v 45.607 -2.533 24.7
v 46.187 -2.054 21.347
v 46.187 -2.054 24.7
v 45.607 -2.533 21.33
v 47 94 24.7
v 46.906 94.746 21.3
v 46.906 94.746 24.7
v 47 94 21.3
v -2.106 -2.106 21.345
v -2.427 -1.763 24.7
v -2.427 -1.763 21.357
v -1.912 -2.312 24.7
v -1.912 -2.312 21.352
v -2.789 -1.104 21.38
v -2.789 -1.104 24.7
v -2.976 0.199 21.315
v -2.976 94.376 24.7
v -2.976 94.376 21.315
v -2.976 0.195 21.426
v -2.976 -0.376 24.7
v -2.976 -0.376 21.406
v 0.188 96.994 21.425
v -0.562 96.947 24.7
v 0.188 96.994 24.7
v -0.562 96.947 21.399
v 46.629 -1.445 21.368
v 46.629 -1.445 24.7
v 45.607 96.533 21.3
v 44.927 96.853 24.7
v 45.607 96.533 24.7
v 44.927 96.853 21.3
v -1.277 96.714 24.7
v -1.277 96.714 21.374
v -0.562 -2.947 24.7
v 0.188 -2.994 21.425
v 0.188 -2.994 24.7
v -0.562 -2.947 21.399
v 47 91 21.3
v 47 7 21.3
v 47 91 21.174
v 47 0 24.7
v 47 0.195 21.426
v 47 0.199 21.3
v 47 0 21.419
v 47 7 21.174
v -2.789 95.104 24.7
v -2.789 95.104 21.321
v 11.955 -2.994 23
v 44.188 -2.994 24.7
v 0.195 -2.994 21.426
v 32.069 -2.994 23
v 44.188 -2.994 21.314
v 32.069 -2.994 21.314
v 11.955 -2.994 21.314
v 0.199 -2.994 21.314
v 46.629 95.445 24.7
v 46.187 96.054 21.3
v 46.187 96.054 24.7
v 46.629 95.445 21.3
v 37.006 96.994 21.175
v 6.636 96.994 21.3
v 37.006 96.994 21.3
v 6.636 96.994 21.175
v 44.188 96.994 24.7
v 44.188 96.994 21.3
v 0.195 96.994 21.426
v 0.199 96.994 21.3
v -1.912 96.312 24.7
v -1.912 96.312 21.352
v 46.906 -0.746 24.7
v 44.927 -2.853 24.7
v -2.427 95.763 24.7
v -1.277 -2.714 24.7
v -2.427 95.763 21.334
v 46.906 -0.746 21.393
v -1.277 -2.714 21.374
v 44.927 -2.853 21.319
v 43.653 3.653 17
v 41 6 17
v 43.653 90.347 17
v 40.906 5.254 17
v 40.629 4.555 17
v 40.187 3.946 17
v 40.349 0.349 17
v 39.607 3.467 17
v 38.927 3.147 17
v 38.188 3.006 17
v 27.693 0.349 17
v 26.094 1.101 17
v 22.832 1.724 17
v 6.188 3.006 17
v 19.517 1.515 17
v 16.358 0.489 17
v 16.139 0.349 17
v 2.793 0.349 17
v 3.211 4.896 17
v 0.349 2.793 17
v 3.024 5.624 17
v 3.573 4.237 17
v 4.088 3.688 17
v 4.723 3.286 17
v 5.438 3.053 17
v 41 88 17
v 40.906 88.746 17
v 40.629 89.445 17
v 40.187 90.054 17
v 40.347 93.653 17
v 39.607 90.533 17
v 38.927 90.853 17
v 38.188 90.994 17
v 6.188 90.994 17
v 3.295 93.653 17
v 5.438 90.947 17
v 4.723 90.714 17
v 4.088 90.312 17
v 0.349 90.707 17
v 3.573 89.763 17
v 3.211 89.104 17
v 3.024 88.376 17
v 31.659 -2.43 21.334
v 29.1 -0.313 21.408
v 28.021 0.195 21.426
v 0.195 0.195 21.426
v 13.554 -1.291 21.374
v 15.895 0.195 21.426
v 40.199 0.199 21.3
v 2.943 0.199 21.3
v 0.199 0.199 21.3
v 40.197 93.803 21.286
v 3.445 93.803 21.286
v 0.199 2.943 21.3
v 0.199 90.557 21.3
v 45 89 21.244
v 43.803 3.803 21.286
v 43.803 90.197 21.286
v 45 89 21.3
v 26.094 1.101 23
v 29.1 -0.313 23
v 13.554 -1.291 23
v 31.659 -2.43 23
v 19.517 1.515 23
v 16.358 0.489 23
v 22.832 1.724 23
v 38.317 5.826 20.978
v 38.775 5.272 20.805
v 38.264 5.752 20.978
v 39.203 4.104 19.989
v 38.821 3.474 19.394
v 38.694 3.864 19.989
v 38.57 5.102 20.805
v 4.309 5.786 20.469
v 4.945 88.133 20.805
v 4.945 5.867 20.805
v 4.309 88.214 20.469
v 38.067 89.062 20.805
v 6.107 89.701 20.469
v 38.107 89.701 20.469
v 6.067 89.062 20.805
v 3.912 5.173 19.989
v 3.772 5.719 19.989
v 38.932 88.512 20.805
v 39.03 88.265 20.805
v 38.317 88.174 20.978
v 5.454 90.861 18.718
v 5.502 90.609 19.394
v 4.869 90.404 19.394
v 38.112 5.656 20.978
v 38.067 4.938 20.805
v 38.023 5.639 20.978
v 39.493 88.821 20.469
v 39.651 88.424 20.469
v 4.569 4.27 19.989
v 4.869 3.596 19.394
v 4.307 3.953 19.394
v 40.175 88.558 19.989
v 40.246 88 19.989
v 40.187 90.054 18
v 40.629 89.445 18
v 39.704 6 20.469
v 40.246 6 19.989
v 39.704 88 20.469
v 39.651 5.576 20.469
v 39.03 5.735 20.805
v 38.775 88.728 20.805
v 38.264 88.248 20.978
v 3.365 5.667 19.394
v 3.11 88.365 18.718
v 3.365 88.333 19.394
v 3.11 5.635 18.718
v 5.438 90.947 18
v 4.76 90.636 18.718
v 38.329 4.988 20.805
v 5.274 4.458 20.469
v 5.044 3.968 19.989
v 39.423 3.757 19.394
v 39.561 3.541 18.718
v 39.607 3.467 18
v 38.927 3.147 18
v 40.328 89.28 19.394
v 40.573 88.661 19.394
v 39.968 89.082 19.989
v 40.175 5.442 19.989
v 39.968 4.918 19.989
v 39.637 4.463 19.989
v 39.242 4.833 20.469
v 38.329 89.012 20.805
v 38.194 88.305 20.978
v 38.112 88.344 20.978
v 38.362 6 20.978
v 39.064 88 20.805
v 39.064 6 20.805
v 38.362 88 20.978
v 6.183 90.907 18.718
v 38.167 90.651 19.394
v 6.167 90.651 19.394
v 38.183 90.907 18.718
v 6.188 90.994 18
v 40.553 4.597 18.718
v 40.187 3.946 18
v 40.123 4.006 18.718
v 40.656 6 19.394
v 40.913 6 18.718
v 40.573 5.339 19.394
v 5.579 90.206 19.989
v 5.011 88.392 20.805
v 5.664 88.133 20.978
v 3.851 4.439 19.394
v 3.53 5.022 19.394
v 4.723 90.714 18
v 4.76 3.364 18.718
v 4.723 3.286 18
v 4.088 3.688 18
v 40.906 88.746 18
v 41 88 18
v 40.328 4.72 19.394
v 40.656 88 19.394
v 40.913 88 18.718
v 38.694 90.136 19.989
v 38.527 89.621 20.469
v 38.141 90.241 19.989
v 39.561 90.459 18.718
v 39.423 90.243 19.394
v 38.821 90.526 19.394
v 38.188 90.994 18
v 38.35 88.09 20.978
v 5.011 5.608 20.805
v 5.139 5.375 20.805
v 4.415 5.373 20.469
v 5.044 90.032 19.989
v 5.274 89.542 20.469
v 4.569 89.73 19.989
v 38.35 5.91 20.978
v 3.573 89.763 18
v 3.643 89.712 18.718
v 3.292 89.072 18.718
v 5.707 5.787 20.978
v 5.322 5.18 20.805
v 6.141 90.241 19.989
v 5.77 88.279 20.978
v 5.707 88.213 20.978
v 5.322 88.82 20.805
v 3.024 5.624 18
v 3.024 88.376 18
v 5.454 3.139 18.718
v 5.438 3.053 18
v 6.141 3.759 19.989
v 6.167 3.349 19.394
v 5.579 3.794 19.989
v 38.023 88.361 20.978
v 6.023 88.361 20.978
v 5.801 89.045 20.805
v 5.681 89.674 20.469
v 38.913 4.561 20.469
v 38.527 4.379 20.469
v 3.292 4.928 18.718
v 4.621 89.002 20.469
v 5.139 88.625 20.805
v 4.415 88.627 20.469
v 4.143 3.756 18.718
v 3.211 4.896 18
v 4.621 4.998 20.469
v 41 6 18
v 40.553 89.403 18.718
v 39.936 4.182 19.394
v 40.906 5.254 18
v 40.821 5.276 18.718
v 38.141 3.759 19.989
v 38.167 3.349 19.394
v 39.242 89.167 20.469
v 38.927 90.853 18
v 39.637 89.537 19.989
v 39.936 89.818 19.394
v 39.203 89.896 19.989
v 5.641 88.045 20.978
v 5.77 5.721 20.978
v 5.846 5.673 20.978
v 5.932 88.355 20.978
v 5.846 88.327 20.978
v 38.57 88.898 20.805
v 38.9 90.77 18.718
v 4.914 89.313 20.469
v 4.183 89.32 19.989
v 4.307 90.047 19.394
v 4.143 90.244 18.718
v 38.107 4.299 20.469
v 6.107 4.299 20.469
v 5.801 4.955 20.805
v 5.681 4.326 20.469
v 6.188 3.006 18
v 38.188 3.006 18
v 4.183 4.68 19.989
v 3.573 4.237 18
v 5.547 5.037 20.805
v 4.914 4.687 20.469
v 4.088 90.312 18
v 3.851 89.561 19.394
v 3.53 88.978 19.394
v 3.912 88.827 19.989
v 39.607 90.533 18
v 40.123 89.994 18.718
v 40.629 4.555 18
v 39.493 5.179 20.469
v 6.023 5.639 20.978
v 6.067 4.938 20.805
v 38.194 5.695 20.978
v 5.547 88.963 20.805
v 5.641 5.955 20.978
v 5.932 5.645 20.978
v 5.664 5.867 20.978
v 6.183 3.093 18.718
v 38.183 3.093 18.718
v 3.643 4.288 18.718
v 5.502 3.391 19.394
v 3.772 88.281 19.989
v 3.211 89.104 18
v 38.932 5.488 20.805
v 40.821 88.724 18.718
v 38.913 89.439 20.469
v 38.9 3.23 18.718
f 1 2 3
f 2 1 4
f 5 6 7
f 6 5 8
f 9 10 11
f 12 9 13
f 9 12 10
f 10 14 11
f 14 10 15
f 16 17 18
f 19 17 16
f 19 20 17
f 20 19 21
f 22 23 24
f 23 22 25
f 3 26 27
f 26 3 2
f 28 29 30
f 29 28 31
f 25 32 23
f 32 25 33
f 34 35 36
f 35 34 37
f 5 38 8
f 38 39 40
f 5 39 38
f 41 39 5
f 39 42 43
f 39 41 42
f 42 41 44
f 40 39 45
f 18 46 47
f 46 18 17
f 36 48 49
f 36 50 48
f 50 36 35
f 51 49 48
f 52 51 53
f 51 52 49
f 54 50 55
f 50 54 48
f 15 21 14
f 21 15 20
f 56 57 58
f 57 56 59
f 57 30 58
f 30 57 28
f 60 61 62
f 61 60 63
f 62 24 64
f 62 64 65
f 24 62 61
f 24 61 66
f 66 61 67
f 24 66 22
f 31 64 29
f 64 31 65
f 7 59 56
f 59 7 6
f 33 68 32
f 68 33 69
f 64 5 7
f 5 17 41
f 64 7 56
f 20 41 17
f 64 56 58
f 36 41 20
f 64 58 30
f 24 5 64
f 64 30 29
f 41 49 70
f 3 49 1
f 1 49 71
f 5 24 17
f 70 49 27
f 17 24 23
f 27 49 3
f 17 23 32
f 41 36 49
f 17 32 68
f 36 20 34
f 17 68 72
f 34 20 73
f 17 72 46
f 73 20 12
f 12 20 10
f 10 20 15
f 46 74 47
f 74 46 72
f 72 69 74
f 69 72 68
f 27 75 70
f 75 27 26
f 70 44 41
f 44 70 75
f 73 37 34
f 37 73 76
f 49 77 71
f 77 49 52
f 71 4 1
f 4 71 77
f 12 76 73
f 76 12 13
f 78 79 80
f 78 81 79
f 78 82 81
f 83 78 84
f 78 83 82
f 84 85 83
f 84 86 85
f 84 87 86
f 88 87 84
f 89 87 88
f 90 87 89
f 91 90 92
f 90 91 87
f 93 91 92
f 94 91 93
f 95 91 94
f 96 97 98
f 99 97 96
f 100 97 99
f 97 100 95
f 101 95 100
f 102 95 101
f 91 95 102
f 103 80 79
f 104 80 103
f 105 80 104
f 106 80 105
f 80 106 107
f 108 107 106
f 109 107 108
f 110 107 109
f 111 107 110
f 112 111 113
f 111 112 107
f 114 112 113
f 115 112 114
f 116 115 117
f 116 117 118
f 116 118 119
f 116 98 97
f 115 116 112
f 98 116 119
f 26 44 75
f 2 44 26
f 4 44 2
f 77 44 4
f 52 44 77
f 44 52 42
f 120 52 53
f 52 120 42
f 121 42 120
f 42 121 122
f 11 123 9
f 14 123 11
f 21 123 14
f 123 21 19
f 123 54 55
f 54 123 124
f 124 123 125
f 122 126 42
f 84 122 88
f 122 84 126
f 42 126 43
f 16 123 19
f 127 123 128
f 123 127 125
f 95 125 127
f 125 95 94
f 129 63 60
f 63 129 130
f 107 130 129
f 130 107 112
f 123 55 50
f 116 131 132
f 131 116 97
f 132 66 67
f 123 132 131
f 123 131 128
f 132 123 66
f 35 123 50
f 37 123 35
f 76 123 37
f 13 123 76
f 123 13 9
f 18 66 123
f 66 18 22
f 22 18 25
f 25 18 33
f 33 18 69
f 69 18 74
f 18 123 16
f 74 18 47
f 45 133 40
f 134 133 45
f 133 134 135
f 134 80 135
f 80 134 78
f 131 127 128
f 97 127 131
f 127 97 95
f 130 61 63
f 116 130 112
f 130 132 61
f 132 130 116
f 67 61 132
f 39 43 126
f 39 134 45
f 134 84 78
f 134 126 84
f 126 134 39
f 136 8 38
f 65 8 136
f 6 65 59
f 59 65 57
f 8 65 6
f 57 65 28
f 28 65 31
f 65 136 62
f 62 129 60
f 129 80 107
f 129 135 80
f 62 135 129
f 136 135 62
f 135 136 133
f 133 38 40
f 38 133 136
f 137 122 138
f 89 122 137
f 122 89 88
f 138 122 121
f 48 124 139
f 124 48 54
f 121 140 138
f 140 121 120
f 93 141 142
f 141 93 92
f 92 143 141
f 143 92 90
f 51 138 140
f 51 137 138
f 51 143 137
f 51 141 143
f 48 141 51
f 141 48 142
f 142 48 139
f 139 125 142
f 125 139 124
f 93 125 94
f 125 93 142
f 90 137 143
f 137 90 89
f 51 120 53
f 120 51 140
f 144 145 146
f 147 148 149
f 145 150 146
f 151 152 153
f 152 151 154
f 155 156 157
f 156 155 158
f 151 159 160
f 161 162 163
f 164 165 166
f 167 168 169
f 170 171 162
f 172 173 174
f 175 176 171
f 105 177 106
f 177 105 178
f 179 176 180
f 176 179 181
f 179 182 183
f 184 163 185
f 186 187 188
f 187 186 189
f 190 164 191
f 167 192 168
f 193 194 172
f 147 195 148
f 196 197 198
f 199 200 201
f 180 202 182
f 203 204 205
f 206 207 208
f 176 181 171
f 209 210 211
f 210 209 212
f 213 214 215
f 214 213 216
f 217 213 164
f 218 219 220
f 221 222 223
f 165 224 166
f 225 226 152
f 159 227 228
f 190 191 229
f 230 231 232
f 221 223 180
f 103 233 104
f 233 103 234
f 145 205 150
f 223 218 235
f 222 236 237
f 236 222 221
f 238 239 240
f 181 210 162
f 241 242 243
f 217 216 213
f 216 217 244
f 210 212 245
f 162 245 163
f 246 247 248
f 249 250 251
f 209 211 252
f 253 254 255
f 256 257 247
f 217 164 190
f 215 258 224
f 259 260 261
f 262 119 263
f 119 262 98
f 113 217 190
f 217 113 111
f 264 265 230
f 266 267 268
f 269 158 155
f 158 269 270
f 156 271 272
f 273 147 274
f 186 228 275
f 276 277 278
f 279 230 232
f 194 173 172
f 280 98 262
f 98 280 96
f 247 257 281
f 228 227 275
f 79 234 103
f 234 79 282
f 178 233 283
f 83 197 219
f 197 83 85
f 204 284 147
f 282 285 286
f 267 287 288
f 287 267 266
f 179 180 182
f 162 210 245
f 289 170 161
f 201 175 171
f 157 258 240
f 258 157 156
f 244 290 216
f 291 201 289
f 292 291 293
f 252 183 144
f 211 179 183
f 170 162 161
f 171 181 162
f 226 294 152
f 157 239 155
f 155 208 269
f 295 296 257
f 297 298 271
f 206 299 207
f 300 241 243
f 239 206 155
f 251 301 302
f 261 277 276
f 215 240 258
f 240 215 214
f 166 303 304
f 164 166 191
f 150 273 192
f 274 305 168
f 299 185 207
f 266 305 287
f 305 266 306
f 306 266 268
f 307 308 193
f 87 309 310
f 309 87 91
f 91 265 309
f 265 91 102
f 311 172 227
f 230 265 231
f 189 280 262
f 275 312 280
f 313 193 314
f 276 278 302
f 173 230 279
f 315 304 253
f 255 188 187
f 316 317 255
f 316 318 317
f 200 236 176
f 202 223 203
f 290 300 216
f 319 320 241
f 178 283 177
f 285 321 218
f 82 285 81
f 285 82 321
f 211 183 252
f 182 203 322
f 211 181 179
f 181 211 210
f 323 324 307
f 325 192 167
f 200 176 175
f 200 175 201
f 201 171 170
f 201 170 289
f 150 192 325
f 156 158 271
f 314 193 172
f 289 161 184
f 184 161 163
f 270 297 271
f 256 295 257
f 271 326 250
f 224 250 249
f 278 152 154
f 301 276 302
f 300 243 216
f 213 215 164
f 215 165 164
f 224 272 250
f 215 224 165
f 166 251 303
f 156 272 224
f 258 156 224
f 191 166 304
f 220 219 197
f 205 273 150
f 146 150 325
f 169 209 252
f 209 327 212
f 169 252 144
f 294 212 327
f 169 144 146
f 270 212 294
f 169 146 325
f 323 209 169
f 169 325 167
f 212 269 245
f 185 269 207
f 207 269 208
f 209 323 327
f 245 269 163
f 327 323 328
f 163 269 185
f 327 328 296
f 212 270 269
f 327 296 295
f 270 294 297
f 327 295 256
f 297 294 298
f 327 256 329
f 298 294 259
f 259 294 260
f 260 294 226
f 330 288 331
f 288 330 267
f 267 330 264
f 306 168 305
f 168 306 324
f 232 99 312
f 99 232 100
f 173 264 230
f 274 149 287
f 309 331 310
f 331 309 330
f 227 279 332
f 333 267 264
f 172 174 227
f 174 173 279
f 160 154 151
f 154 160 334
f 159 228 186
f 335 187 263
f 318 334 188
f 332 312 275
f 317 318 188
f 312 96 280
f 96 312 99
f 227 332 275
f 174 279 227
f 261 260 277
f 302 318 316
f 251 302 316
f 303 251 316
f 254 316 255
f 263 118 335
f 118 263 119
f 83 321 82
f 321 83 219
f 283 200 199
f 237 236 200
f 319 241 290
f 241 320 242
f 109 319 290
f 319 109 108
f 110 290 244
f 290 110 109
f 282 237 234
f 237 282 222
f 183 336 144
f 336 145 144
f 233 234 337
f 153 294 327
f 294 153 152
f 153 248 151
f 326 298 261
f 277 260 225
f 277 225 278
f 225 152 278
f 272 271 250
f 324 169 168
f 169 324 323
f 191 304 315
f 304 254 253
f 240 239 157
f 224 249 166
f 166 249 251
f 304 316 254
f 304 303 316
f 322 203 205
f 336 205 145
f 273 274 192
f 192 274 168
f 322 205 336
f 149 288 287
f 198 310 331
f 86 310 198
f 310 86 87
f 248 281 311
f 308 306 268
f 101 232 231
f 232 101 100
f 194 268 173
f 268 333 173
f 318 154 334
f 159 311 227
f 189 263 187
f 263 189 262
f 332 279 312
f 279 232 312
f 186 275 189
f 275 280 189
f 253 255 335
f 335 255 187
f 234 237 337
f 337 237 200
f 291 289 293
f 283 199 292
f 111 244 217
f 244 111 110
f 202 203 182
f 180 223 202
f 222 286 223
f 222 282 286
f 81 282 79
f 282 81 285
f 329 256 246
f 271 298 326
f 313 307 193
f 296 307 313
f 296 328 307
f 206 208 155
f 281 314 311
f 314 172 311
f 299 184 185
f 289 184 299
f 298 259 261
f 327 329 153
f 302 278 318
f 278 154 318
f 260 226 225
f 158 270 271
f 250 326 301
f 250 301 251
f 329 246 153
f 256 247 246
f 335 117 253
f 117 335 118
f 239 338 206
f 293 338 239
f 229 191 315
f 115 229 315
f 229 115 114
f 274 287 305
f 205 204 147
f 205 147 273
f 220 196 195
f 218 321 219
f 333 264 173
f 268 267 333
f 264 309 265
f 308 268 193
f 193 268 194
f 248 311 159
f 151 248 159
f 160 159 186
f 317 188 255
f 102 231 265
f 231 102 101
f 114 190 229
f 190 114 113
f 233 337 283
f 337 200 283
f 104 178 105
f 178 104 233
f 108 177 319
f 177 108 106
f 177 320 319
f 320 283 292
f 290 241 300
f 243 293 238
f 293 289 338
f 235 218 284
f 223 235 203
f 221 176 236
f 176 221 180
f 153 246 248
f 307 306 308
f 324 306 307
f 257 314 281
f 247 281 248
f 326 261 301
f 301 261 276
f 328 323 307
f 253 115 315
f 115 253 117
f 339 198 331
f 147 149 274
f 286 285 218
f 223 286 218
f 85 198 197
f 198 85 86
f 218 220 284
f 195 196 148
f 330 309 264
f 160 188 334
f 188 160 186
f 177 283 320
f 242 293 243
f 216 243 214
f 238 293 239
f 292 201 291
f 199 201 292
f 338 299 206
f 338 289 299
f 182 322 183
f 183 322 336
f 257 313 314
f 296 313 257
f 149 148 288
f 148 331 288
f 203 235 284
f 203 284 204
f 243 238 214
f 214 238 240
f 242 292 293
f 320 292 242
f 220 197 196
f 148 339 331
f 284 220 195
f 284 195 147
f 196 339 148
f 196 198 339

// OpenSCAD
// file: lib/shapes.scad
module arrow(width=4, height=4, depth=1) {
	x = width / 4;
	y = height / 4;
	linear_extrude(height = depth)
		polygon(points=[[0, -2*y], [2*x, 0], [0, 2*y], [0, y], [-2*x, y], [-2*x, -y], [0, -y], [0, -2*y]]);
}

module centerPos(size=8, depth=1) {
	i = size / 10;

rotate([0, 0, -90]) {
	difference() {
		cylinder(r=size, h=depth);
		translate([0, 0, -.1])
			cylinder(r=8*i, h=depth+.2);
			translate([-3*i,0,-.1])
				cube([6*i,15*i,depth+.2]);
		}
		cylinder(r=3*i,h=depth);
		translate([-i,0,0])
			cube([2*i,13*i,depth]);
		translate([-i, 16*i, 0])
			cube([2*i, 8*i, depth]);
		translate([-4*i, 19*i, 0])
			cube([8*i, 2*i, depth]);
}
}
// file: lib/parts.scad
// @2014 - mkellner@robotranch.org
//module potentiometer(angle = 0);
//module sw3pdt();
//module swdp3t();
//module swspst(angle = 0);
//module socket(angle = 90);
//module socketEnclosed(angle = 90);
//module DcJack();
//module smDcJack();
//module ledMount();
//module ledMountSm();

slop = 0.4;

module rotarySwitch(angle = 0) {
	outerCylR = (26 + slop) / 2;
	outerCylD = 12;
	outerRectW = 31;
	outerRectH = 10;
	connectorsR = 20 / 2;
	connectorsD = 6.8;
	shaftR = (8.76 + slop) / 2;
	shaftD = 15;

	tabW = 3.4;
	tabH = 2.6;
	tabD = 2;

	rotate([0, 180, angle])
	translate([0, 0, -outerCylD/2])

	union() {
		cylinder(r = outerCylR, h = outerCylD, center = true);
		translate([0, 0, outerCylD])
			cylinder(r = shaftR, h = shaftD, center = true);
		translate([0, 0, 0])
			cube([outerRectH, outerRectW, outerCylD], center = true);
		rotate([0, 0, 90])
			translate([-tabW/2, -outerCylR-2+tabH/2, outerCylD / 2])
				#cube([tabW, tabH, tabD]);

		translate([0, 0, -outerCylD + connectorsD / 2])
			cylinder(r = connectorsR, h = connectorsD, center = true);
	}
}

module potentiometer(angle = 0) {

	potCylR = (17 + slop) / 2;
	potCylD = 9.3;
	potShaftR = (6.76 + slop) / 2;
	potShaftD = 15;
	potBoard = 12;
	potBoardD = 6.3;
	potTabW = 3.3;
	potTabH = 2.0;
	potTabD = 2;

	rotate([0, 180, angle])
	translate([0, 0, -potCylD/2])

	union() {
		cylinder(r = potCylR, h = potCylD, center = true);
		translate([0, 0, potCylD])
			cylinder(r = potShaftR, h = potShaftD, center = true);
		translate([0, -potCylR, potCylD/2 - potBoardD])
			cube([potBoard, potCylR * 2, potBoardD]);
		translate([-potTabW/2, -potCylR-0.5, potCylD / 2])
			#cube([potTabW, potTabH, potTabD]);
	}
}

module sw3pdt() {
	swBodyW = 18;
	swBodyH = 17;
	swBodyD = 20;
	swShaftR = (11.72 + slop) / 2;
	swShaftD = 12.5;
	swShaft2R = 8 / 2;
	swShaft2D = 5.11;
	swShaft3D = 5;

	rotate([0, 180, 0])
		union() {
			translate([-swBodyW/2, -swBodyH/2, -swBodyD])
				#cube([swBodyW, swBodyH, swBodyD]);
			translate([0, 0, swShaftD / 2]) //  swBodyD + swShaftD/2])
				cylinder(r = swShaftR, h = swShaftD, center = true);
			translate([0, 0, swShaftD + swShaft2D / 2]) //  swBodyD + swShaftD/2])
				cylinder(r = swShaft2R, h = swShaft3D, center = true);
			translate([0, 0, swShaftD + swShaft2D + swShaft3D / 2]) //  swBodyD + swShaftD/2])
				cylinder(r = swShaftR, h = swShaft3D, center = true);
		}
}

module swdp3t(angle = 0) {
    swBodyW = 12.62;
    swBodyH = 13;
    swBodyD = 14.5;
    swShaftR = (5.8 + slop) / 2;
    swShaftD = 8.5;

	tabW = 2.5 + 0.25;
	tabH = 0.75 + 1.25;
	tabD = 2;

	rotate([0, 180, angle])
	union() {
	    translate([-swBodyW/2, -swBodyH/2, -swBodyD])
			#cube([swBodyW, swBodyH, swBodyD]);
		translate([0, 0, swShaftD / 2]) //  swBodyD + swShaftD/2])
			cylinder(r = swShaftR, h = swShaftD, center = true);
		translate([-tabW/2, -6 - tabH/2, 0])
			#cube([tabW, tabH, tabD]);
	}
}

module swspst(angle = 0) {
    swBodyW = 8;
    swBodyH = 13;
    swBodyD = 14.5;
    swShaftR = (5.8 + slop) / 2;
    swShaftD = 8.5;

	tabW = 2.5 + 0.25;
	tabH = 0.75 + 1.25;
	tabD = 2;

	rotate([0, 180, angle])
	union() {
	    translate([-swBodyW/2, -swBodyH/2, -swBodyD])
			#cube([swBodyW, swBodyH, swBodyD]);
		translate([0, 0, swShaftD / 2]) //  swBodyD + swShaftD/2])
			cylinder(r = swShaftR, h = swShaftD, center = true);
		translate([-tabW/2, -6 - tabH/2, 0])
			#cube([tabW, tabH, tabD]);
	}
}

module socket(angle = 90) {
	sktR = (8.67 + slop) / 2;
	sktD = 7.6;
	sktBaseR = 20.40 / 2;
	sktBaseH = 23.6;

	rotate([angle, 0, 90])
		union() {
			cylinder(r = sktR, h = sktD);
			translate([0, 0, -sktBaseH])
			cylinder(r = sktBaseR, h = sktBaseH);
		}
}

module socketEnclosed(angle = 90) {
	sktR = (8.67 + slop) / 2;
	sktD = 5.8;
//	sktBaseR = 20.40 / 2;
	sktBaseR = 15.75;
	sktBaseH = 26;

	rotate([angle, 0, 90])
		union() {
			cylinder(r = sktR, h = sktD);
			translate([-sktBaseR/2, -sktBaseR/2, -sktBaseH])
				cube([sktBaseR, sktBaseR, sktBaseH]);
		}
}

module DcJack(angle = -90) {
	dcJackR = (11.75 + slop) / 2;
	dcJackD = 8;
	dcJackBaseR = 15.50 / 2;
	dcJackBaseH = 11;

	rotate([angle, 0, 0])
		union() {
		    cylinder(r = dcJackR, h = dcJackD);
		    translate([0, 0, -dcJackBaseH])
		    cylinder(r = dcJackBaseR, h = dcJackBaseH);
		}
}

module smDcJack() {
	dcJackR = (7.75 + slop) / 2;
	dcJackD = 5.5;
	dcJackBaseR = 10.75 / 2;
	dcJackBaseH = 15.65;

	rotate([-90, 0, 0])
		union() {
		    cylinder(r = dcJackR, h = dcJackD);
		    translate([0, 0, -dcJackBaseH])
		    cylinder(r = dcJackBaseR, h = dcJackBaseH);
		}
}

module ledMount() {
	ledMountR = (7.75 + slop) / 2;
	ledMountD = 10;
	ledMountBaseR1 = 9 / 2;
	ledMountBaseR2 = 8 / 2;
	ledMountBaseH = 3.8;

	rotate([0, 180, 0])
		union() {
		    cylinder(r1 = ledMountBaseR1, r2 = ledMountBaseR2, h = ledMountBaseH);
		    translate([0, 0, -ledMountD])
			    cylinder(r = ledMountR, h = ledMountD);
		}
}

module ledMountSm() {
	ledMountR = (7 + slop) / 2;
	ledMountD = 6.7;
	ledMountBaseR = 7.9 / 2;
	ledMountBaseH = 0.9;

	rotate([0, 180, 0])
		union() {
		    cylinder(r = ledMountBaseR, h = ledMountBaseH);
		    translate([0, 0, -ledMountD])
			    cylinder(r = ledMountR, h = ledMountD);
		}
}

module 9vBattery() {
	9vW = 26.1;
	9vH = 43.9;
	9vD = 16.9;
	neg = 8.2 / 2;
	pos = 5.7 / 2;
	termD = 3.4;
	termOffset = 6.5;
	capD = 4;
	

	cube([9vW, 9vH, 9vD]);
	translate([termOffset, 0, 9vD / 2])
		rotate([90, 90, 0])
			#cylinder(r = neg, h = termD);
	translate([9vW - termOffset, 0, 9vD / 2])
		rotate([90, 90, 0])
			#cylinder(r = pos, h = termD);
    translate([3, -termD, 3])
        rotate([90, 0, 0])
			minkowski() {
	            cube([9vW-6, 9vD-6, capD]);
				cylinder(r=3);
			}

}
// main file
// @2015 - mkellner@robotranch.orog
$fn=25;

use <lib/parts.scad>;
use <lib/shapes.scad>;

doBox = 1;
doFoot = 2;
doLabelSlice = 3;


perform = doFoot;			// doBox, doFoot or doLabelSlice



textDepth = perform == doFoot ? 3 : 0.7;

wallD = 3;

inBoxW = 44;			// Altoids 58.5
inBoxH = 94;			// Altoids 93.5
inBoxD = 20;			// Altoids 21.5

outBoxW = inBoxW; // + wallD * 2;
outBoxH = inBoxH; // + wallD * 2;
outBoxD = inBoxD + wallD;

footD = 4.2;
footWallD = 3;

quarterR = 26.5 / 2;
quarterH = 2;

module quarter() {
    cylinder(r=quarterR,h=quarterH+5,center=true);
}

module label(tx = "label", sz = 5, depth=1, font = "Courier", halign = "center", valign = "center") {
	linear_extrude(height = depth)
		text(tx, size=sz, font=font, halign=halign, valign=valign);

}
module foot() {
	difference()
		{
		translate([0, 0, -wallD + inBoxD])
			minkowski() {
				cube([outBoxW, outBoxH, footD + wallD]);
				cylinder(r=3,h=.5);
			}
		translate([-wallD, -wallD, -wallD/2-.2])
			rotate([2,0,0])
				cube([outBoxW + 2*wallD, wallD+1, outBoxD]);
		translate([-wallD, outBoxH-1, -wallD/2-.2])
			rotate([-2,0,0])
				cube([outBoxW + 2*wallD, wallD+1, outBoxD]);
		translate([-wallD, -wallD, -wallD/2-.2])
			rotate([0,-2,0])
				cube([wallD+1, outBoxH + 2*wallD, outBoxD]);
		translate([outBoxW-1, -wallD, -wallD/2-.2])
			rotate([0,2,0])
				cube([wallD+2, outBoxH + 2*wallD, outBoxD]);

		translate([0, -11, outBoxD-10-wallD/2-.2])
			rotate([0, 0, 45])
				cube([10, 20, 10]);
		translate([-10.5, outBoxH, outBoxD-10-wallD/2-.2])
			rotate([0, 0, -45])
				cube([10, 20, 10]);
		translate([outBoxW-5, -1, outBoxD-10-wallD/2-.2])
			rotate([0, 0, -45])
				cube([10, 20, 10]);
		translate([outBoxW+1, outBoxH-5, outBoxD-10-wallD/2-.2])
			rotate([0, 0, 45])
				cube([10, 20, 10]);

		//config1();
		box();
		translate([outBoxW/2, -11.5, inBoxD+2.5-wallD])
			#quarter();

		translate([wallD+footWallD, wallD+footWallD, wallD-3])
			minkowski() {
				cube([inBoxW-(2*footWallD + 6), inBoxH-(2*footWallD + 6), inBoxD+1-wallD]);
				sphere(r=3);
			}


if (0) {
		rotate([0, 0, 90])
			{
				translate([50, -30, outBoxD + wallD -textDepth+.9])
					label(tx="robotranch", sz=14, font="Futura", depth=textDepth);
				translate([50, -50, outBoxD + wallD -textDepth+.9])
					label(tx=".org", sz=14, font="Futura", depth=textDepth);
				translate([50, -10, outBoxD + wallD -textDepth+.9])
					label(tx="2014", sz=14, font="Futura", depth=textDepth);
			}
}
	}
}

module box() {
	difference() {
//		translate([-wallD, -wallD, -wallD])
		translate([0, 0, -wallD])
			minkowski() {
				cube([outBoxW, outBoxH, outBoxD]);
				cylinder(r=3,h=.5);
			}
		cube([inBoxW, inBoxH, inBoxD+1]);

	}

}


module config1() {
	offsetPotX = inBoxW - 12;
	offsetPotY = inBoxH - 11;
	offsetPot2X = 12;
	offsetPot2Y = inBoxH - 11 - 23;
	offsetPot3Y = inBoxH - 11 - 23 - 23;
	offsetPot4Y = inBoxH - 11 - 23 - 23 - 23;
	offsetSWX = 8;
	offsetSWY = inBoxH - 43;
	offsetDCX = inBoxH / 3;
	offsetDCY = inBoxH-.1;
	offsetDCZ = 6;
	offsetJackInX = inBoxW-.1;
	offsetJackInY = 37;
	offsetJackInZ = 10.5;
	offsetJackOutX = .1;
	offsetJackOutY = 37;
	offsetJackOutZ = 10.5;

	difference() {
		box();
        translate([offsetPotX, offsetPotY, 0])
            #potentiometer(angle = 90);
        translate([offsetPotX, offsetPot2Y, 0])
            #potentiometer(angle = 90);
        translate([offsetPotX, offsetPot3Y, 0])
            #potentiometer(angle = 90);
        translate([offsetPotX, offsetPot4Y, 0])
            #potentiometer(angle = 90);
        translate([offsetPot2X, offsetPotY, 0])
            #potentiometer(angle = 90);
        translate([offsetPot2X, offsetPot2Y, 0])
            #potentiometer(angle = 90);
        translate([offsetPot2X, offsetPot3Y, 0])
            #potentiometer(angle = 90);
        translate([offsetPot2X, offsetPot4Y, 0])
            #potentiometer(angle = 90);

		// gap for wires on right
		rotate([90, 180, 270]) {
			translate([offsetJackOutY + 16, -outBoxD+2.3, wallD-5])
                #cube([10, 5, 5]);
		}

		// back face
		rotate([-90, 0, 180]) {
			translate([-(outBoxW/2), -(outBoxD/2)+3, wallD-textDepth])
				label(tx="knobby", sz=8, font="Futura");
		}

if (0) {
		// front face
		rotate([-90, 0, 0]) {
			translate([(offsetDCX)-12, -offsetDCZ, (outBoxH + wallD) -textDepth])
				label(tx="front", sz=7, font="Futura");
		}

		// right face
		rotate([90, 180, 270]) {
			translate([offsetJackOutY + 16, -offsetJackOutZ, wallD-textDepth])
				label(tx="right", sz=8, font="Futura");
		}

		// left face
		rotate([90, 180, 90]) {
			translate([-offsetJackInY -37, -offsetJackInZ, offsetJackInX+wallD-textDepth])
				label(tx="left", sz=8, font="Futura", depth=2);
		}

	}
}

}

if (perform == doBox) {
	config1();
} else if (perform == doFoot) {
	foot();
} else if (perform == doLabelSlice) {
	translate([0, 0, 2])
	projection(cut = false)
		config1();
}
